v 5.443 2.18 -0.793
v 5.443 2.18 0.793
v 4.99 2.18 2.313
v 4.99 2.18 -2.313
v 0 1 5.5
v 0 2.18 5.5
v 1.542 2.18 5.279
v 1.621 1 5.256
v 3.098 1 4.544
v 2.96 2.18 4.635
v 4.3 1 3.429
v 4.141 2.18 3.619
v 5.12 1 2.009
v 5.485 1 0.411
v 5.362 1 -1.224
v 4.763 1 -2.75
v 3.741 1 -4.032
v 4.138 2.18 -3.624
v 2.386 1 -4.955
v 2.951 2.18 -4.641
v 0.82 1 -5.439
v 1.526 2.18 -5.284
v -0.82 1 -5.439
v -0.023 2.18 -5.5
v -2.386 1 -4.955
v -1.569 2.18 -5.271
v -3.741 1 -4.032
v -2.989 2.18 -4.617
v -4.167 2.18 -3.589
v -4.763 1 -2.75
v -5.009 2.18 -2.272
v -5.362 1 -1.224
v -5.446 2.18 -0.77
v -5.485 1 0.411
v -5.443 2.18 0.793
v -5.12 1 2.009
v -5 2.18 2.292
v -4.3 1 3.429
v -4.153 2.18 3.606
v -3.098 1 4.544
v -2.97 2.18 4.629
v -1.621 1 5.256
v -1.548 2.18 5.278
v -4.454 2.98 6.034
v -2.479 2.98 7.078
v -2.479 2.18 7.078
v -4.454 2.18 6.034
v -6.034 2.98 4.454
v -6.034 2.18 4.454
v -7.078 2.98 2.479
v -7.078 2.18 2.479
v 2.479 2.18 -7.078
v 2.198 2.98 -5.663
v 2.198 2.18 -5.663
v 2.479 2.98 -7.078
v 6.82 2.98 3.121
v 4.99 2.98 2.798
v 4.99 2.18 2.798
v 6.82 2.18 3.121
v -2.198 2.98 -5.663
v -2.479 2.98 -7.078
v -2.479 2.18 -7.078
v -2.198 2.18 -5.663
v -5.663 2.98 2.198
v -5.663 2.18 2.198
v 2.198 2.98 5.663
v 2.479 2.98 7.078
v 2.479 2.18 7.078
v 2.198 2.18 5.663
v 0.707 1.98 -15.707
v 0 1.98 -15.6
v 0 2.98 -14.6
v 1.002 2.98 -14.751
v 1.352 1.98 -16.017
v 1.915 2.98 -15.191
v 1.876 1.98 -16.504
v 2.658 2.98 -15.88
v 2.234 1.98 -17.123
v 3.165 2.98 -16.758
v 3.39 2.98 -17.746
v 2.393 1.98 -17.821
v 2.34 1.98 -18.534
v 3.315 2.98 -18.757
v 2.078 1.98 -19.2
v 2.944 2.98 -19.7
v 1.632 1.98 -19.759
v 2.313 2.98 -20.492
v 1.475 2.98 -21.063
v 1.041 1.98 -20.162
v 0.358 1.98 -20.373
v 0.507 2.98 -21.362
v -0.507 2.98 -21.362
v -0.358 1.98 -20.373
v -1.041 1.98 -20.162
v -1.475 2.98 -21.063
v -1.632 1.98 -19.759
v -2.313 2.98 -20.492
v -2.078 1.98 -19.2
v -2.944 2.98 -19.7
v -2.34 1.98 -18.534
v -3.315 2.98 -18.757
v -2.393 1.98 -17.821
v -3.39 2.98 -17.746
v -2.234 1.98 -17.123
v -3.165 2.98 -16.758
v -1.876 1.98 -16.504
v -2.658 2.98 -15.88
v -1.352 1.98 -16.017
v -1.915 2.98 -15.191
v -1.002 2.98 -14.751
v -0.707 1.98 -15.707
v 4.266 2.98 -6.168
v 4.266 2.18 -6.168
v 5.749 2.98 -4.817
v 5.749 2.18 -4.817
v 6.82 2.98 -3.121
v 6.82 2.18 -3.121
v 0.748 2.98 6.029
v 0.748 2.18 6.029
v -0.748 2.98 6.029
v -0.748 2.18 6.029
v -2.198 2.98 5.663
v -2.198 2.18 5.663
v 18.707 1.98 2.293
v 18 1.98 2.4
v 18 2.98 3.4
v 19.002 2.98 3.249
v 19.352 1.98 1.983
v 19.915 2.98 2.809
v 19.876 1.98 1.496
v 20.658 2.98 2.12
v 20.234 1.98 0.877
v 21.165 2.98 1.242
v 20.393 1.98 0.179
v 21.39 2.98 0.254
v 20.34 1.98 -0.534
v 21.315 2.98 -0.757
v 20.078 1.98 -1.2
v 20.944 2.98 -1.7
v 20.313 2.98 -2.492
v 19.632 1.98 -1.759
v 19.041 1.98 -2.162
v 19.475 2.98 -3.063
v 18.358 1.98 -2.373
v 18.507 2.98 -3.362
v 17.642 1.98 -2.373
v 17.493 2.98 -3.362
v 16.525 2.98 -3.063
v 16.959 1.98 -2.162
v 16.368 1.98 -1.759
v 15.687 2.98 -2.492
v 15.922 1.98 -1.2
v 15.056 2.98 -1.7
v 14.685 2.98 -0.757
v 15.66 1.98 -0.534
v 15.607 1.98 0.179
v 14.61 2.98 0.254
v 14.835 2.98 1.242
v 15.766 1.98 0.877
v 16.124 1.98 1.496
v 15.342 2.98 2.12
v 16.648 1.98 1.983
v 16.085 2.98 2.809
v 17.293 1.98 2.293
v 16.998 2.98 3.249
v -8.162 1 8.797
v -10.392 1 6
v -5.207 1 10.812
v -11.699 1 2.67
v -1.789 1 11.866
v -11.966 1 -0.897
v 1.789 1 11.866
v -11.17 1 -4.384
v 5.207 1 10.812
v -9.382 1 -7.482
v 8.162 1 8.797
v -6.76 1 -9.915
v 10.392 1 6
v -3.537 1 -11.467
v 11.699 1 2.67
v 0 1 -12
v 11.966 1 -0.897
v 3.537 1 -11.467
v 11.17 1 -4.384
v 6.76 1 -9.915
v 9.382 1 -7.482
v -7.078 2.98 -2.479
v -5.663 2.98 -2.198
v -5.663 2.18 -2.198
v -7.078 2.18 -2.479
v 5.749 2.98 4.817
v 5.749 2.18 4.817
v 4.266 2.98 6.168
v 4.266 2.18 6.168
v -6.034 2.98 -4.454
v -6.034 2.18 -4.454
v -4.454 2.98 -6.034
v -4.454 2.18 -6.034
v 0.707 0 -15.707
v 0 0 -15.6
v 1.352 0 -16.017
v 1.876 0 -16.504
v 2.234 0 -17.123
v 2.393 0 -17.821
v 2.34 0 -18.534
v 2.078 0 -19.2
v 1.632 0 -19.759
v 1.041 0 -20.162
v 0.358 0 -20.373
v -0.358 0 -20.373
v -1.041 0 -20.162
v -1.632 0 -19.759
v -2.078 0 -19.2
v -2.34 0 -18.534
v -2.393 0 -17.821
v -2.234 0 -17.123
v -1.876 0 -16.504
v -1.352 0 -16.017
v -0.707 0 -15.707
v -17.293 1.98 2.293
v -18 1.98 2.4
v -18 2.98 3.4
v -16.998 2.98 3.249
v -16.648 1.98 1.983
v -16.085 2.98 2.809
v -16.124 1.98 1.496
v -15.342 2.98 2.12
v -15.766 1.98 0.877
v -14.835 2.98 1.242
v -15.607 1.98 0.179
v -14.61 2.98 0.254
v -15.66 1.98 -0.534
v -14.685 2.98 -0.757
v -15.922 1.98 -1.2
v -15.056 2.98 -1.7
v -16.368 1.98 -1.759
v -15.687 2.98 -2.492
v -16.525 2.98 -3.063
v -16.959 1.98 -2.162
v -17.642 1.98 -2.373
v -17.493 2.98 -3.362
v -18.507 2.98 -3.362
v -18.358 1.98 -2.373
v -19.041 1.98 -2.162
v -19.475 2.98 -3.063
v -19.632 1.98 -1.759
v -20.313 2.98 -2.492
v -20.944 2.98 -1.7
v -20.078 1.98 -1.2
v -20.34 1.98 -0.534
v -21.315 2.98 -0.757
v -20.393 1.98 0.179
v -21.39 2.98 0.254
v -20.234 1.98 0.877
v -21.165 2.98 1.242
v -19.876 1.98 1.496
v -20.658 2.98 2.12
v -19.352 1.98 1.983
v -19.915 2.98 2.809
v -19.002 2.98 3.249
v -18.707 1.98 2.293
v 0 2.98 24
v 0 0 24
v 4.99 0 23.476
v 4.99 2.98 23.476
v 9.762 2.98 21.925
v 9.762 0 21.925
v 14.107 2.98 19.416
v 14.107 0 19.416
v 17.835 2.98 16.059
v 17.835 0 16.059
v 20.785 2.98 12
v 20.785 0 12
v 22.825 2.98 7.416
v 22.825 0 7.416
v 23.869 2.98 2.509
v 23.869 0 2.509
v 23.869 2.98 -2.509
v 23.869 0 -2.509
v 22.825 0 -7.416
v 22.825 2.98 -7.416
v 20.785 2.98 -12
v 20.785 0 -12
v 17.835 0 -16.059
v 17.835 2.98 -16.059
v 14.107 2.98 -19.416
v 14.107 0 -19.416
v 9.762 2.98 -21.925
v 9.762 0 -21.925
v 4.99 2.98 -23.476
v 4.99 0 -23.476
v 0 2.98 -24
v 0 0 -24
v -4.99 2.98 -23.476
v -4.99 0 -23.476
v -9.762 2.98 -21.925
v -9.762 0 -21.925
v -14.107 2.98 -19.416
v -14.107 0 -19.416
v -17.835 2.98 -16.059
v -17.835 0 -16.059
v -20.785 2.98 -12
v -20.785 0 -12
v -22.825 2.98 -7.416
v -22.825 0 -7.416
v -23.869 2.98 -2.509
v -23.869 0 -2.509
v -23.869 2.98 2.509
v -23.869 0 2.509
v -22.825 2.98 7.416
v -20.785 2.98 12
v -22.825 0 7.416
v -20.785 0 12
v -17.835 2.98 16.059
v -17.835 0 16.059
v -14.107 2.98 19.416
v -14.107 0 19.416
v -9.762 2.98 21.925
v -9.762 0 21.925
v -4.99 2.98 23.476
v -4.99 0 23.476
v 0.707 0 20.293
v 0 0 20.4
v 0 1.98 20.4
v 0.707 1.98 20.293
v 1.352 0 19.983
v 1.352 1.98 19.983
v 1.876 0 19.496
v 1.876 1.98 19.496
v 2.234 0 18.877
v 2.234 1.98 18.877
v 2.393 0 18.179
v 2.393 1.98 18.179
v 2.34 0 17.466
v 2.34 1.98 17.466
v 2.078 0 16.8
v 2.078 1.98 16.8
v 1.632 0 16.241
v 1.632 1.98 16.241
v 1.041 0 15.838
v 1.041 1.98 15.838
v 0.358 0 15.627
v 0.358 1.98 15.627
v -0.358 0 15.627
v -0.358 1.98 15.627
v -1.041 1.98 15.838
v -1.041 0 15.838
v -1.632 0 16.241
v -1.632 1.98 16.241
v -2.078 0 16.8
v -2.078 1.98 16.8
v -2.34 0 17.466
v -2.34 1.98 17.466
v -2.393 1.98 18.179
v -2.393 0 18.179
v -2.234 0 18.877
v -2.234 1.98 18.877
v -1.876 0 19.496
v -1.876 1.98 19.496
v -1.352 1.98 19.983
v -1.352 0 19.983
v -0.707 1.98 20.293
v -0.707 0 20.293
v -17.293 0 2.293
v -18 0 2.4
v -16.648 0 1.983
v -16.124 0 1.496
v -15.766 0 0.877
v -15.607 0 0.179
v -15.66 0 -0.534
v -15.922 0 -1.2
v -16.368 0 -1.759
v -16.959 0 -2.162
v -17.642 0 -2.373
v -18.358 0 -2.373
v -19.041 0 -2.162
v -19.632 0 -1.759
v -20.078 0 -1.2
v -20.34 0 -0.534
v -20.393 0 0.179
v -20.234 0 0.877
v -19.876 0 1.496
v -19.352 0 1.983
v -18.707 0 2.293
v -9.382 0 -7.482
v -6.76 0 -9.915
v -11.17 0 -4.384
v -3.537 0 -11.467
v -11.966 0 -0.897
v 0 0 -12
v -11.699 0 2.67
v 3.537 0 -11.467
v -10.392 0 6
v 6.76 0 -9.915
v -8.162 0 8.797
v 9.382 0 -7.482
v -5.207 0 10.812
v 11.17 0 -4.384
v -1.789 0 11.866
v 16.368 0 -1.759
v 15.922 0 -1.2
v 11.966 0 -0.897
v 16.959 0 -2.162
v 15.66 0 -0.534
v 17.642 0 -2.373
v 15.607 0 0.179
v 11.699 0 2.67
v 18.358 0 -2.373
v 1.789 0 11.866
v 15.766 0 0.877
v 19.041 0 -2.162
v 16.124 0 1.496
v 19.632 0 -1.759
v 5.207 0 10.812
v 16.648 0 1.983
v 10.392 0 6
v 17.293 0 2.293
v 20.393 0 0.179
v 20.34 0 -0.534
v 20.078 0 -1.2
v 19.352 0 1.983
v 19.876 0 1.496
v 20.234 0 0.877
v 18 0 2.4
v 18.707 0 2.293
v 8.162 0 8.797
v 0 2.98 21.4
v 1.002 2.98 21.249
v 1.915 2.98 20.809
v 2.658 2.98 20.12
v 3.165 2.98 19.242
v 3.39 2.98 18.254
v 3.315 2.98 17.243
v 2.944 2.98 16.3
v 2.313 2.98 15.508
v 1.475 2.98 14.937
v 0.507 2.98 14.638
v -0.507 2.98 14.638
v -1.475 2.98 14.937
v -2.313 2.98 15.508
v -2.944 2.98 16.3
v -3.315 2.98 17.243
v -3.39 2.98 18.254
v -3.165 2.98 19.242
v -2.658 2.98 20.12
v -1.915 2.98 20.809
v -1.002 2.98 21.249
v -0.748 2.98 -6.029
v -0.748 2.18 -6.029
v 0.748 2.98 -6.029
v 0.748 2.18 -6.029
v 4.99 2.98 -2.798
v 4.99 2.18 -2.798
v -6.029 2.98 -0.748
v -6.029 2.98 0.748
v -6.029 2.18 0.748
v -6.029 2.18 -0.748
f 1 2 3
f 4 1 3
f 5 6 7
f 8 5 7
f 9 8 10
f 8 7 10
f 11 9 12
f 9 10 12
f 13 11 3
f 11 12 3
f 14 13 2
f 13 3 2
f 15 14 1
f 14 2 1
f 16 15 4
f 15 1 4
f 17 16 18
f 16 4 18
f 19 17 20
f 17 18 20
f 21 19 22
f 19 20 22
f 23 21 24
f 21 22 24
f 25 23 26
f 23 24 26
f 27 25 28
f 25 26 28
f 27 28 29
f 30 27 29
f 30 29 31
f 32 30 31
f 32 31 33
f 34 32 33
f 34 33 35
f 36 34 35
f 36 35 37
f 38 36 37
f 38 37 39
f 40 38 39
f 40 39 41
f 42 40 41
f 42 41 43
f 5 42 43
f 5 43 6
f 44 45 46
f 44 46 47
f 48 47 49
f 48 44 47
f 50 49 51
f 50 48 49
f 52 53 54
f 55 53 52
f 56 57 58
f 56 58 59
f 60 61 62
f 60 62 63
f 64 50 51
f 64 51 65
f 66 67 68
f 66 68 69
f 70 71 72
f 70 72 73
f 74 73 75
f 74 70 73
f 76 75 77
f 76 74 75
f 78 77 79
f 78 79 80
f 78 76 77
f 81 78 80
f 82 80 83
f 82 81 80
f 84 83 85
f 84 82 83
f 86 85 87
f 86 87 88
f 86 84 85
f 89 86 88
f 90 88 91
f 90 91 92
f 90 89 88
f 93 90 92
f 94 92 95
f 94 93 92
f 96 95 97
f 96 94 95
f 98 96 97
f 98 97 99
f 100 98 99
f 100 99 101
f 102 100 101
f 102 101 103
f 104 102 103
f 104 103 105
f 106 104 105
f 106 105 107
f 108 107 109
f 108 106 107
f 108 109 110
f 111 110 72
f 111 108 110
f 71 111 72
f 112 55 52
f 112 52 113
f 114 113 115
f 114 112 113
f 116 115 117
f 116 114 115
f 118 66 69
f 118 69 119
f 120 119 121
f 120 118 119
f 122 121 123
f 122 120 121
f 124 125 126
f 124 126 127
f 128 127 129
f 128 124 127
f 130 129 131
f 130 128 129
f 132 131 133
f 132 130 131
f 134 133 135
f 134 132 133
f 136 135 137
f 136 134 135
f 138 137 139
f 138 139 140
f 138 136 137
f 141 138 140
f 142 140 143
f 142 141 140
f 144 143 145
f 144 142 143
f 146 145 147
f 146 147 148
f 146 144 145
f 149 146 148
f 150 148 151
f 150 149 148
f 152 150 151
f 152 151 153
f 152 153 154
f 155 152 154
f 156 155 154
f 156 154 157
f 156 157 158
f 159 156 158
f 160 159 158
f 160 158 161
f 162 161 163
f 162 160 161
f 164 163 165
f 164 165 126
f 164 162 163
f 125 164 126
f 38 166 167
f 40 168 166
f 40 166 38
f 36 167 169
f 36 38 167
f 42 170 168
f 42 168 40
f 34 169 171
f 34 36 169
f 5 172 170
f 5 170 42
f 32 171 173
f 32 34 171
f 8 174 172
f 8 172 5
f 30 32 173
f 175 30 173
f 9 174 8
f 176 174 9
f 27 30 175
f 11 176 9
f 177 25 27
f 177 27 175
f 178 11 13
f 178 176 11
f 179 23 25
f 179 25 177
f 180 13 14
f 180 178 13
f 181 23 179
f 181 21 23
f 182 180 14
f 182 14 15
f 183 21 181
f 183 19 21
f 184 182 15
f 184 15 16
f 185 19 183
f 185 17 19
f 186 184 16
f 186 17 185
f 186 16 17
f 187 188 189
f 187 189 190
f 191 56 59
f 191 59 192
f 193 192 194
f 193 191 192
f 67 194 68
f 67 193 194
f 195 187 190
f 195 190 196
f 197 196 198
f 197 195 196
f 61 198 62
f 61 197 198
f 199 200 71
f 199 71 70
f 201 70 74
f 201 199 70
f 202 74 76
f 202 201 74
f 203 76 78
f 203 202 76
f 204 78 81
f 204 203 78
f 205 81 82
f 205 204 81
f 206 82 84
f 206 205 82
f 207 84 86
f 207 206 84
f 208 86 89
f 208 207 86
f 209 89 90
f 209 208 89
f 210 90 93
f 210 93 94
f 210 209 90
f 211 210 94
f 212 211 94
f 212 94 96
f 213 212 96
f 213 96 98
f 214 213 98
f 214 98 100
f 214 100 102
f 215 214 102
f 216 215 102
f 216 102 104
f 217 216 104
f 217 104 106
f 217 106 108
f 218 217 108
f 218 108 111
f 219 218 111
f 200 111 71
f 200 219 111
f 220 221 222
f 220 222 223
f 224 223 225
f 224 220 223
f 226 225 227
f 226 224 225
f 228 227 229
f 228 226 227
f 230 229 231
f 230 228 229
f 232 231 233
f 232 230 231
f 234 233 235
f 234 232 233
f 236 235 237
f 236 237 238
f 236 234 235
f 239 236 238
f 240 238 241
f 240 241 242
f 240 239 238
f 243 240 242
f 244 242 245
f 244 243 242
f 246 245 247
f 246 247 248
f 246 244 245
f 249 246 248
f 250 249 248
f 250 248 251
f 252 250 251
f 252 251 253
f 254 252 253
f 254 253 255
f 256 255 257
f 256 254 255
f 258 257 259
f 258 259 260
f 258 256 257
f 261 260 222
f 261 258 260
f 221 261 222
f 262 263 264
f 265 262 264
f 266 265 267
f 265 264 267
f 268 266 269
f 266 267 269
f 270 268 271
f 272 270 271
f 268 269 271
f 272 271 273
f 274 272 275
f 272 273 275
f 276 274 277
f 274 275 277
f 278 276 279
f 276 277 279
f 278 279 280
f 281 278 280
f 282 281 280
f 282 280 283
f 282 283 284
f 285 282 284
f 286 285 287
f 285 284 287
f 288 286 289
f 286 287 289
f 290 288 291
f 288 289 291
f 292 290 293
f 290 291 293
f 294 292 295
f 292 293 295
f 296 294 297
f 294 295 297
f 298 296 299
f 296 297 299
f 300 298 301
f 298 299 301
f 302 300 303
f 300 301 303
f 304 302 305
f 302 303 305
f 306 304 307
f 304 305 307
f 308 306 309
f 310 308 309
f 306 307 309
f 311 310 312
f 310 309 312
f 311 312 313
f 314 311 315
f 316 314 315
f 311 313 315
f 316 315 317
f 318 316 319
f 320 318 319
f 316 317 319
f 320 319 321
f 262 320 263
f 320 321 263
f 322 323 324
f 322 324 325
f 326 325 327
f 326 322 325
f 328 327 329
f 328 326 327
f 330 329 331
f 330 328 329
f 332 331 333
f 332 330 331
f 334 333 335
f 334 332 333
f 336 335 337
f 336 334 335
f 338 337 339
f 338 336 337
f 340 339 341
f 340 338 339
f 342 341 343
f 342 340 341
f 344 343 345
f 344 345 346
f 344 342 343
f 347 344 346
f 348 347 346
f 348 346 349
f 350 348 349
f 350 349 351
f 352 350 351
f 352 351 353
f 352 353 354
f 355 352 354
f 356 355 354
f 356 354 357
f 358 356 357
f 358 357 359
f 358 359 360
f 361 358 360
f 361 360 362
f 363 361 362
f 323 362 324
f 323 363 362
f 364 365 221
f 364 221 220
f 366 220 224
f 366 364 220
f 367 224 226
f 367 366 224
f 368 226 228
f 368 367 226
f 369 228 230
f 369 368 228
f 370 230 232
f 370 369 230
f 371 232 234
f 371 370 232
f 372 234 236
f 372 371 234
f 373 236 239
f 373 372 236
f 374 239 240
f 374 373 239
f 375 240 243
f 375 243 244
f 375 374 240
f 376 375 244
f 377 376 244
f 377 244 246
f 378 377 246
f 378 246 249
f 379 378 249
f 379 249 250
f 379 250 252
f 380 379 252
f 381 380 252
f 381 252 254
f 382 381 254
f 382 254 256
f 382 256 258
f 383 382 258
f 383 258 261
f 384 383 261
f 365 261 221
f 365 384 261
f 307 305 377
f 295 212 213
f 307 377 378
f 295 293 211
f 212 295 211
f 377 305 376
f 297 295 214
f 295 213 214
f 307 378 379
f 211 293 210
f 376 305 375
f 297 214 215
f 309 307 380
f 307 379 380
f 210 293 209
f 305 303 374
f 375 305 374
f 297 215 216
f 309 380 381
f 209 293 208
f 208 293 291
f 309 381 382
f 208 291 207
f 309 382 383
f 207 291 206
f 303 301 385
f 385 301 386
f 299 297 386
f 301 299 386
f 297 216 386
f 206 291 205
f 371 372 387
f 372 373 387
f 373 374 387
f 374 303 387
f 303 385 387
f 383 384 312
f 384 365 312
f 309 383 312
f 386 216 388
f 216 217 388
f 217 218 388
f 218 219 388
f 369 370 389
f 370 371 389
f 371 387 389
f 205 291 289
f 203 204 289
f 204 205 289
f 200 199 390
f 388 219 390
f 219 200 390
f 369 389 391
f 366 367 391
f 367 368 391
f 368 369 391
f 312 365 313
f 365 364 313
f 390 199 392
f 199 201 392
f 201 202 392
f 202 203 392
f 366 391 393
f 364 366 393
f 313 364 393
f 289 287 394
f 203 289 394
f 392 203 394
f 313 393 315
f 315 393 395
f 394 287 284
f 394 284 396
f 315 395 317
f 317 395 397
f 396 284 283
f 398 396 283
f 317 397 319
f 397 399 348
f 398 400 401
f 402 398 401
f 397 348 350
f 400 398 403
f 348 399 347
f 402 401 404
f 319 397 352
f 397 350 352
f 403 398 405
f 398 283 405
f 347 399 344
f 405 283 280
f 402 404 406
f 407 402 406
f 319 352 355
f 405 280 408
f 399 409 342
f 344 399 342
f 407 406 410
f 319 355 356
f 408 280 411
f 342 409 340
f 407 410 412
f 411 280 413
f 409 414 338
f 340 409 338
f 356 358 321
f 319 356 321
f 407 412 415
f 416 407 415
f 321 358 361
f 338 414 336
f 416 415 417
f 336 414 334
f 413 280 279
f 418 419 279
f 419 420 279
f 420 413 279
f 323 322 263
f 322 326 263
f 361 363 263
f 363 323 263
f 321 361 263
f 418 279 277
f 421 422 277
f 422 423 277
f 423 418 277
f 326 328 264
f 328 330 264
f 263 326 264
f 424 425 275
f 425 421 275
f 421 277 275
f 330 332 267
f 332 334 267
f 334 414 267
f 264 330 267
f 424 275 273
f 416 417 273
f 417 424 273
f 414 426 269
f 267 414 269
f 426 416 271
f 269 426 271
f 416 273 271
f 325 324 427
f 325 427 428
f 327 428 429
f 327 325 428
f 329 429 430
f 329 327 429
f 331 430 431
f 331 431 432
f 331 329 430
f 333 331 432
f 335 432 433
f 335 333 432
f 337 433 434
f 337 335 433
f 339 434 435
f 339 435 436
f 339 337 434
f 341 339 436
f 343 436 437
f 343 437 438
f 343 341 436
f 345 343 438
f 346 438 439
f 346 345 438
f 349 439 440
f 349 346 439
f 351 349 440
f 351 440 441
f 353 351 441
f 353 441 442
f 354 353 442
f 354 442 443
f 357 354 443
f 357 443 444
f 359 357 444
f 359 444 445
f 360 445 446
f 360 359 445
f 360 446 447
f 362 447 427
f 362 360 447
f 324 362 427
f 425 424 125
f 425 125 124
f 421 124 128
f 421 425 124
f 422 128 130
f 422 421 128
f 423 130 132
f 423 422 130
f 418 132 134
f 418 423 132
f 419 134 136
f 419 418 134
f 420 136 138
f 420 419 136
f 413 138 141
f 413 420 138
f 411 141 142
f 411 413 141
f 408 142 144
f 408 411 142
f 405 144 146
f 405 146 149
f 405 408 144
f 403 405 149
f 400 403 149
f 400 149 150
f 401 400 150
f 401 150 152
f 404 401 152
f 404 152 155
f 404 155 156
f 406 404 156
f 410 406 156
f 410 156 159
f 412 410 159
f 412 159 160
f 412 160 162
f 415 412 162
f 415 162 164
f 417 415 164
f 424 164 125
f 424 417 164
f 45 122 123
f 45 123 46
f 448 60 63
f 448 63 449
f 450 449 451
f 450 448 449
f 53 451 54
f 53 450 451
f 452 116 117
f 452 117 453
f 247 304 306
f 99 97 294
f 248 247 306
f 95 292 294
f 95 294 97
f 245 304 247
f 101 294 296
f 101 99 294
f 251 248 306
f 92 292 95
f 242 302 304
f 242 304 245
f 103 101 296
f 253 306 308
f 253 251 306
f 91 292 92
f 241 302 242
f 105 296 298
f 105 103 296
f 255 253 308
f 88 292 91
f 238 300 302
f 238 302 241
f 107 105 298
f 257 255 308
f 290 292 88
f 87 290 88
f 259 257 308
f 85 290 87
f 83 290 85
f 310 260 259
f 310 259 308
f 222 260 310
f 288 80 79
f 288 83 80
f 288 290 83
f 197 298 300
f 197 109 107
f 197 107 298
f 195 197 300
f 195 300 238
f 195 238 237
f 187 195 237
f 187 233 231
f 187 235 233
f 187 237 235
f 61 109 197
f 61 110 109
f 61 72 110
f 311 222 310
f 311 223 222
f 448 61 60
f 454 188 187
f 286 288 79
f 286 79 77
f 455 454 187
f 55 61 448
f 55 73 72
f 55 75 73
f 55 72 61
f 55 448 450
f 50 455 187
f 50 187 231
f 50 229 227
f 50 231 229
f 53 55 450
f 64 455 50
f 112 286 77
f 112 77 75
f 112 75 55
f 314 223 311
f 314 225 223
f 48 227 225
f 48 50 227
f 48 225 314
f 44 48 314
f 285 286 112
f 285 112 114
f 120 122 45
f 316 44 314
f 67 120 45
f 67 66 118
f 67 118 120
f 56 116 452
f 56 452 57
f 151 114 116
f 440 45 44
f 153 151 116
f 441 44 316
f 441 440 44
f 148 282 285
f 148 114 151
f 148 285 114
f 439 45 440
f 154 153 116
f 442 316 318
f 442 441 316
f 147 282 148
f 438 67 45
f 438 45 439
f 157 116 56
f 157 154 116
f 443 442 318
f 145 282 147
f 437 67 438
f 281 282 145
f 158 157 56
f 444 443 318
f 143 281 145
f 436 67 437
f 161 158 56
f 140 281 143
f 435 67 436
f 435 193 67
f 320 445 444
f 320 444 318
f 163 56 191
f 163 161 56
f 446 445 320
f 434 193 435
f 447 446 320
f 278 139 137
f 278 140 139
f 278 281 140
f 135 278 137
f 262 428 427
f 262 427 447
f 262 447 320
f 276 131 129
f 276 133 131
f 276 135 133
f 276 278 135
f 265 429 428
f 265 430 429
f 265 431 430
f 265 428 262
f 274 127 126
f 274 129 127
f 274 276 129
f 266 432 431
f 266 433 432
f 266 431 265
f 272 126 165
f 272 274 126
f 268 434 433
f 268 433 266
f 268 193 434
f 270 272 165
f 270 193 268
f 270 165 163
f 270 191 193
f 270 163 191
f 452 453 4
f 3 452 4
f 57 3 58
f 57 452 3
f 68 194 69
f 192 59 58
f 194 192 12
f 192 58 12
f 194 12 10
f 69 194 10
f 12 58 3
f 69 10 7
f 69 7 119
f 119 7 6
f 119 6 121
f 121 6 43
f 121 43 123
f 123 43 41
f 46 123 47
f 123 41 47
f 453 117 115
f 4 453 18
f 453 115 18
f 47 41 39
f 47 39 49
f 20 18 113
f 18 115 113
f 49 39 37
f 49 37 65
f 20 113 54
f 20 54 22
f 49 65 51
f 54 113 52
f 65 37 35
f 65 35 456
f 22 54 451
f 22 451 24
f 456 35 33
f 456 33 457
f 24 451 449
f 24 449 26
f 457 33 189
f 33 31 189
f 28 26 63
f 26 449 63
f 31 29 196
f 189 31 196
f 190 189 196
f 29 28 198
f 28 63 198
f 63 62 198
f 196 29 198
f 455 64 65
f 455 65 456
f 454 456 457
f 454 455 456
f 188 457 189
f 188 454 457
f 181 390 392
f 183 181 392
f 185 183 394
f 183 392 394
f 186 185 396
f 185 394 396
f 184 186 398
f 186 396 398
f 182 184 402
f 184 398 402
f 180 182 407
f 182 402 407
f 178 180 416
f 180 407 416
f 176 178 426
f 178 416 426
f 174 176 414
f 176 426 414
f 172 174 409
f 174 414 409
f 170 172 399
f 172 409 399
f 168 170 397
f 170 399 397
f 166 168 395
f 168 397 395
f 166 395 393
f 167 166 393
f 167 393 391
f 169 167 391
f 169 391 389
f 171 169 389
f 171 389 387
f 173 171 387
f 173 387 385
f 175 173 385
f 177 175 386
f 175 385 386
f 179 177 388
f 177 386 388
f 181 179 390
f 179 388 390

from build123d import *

# Parameters (mm, degrees)
SKETCH1_R           = 24
SKETCH1_R_2         = 2.4
BOSS_EXTRUDE1_DEPTH = 2.98
CUT_EXTRUDE1_DEPTH  = 0.8
SKETCH3_R           = 5.5
CUT_EXTRUDE2_DEPTH  = 35.011062906
CHAMFER1_SIZE       = 1
SKETCH4_R           = 12
CUT_EXTRUDE3_DEPTH  = 1


with BuildPart() as part:
    # Sketch1 → Boss-Extrude1 (new body)
    with BuildSketch(Plane(origin=(0, 0, 0), x_dir=(1, 0, 0), z_dir=(0, 1, 0))):
        with Locations(Location((0, 0, 0), (0, 0, 270))):
            Circle(SKETCH1_R)
        with Locations(Location((0, 18, 0), (0, 0, 270))):
            Circle(SKETCH1_R_2, mode=Mode.SUBTRACT)
        with Locations(Location((-18, 0, 0), (0, 0, 270))):
            Circle(SKETCH1_R_2, mode=Mode.SUBTRACT)
        with Locations(Location((0, -18, 0), (0, 0, 270))):
            Circle(SKETCH1_R_2, mode=Mode.SUBTRACT)
        with Locations(Location((18, 0, 0), (0, 0, 270))):
            Circle(SKETCH1_R_2, mode=Mode.SUBTRACT)
    extrude(amount=BOSS_EXTRUDE1_DEPTH)

    # Sketch2 → Cut-Extrude1 (cut)
    with BuildSketch(Plane(origin=(0, 2.98, 0), x_dir=(1, 0, 0), z_dir=(0, 1, 0))):
        with BuildLine():
            Line((4.989999, 2.798442301), (4.989999, -2.798442301))
            Line((4.989999, -2.798442301), (6.819742519, -3.121075451))
            ThreePointArc((6.819742519, -3.121075451), (5.052929001, -5.542373906), (2.479055714, -7.078437876))
            Line((2.479055714, -7.078437876), (2.198435941, -5.663259169))
            ThreePointArc((2.198435941, -5.663259169), (0, -6.075), (-2.198435941, -5.663259169))
            Line((-2.198435941, -5.663259169), (-2.479055714, -7.078437876))
            ThreePointArc((-2.479055714, -7.078437876), (-5.303300859, -5.303300859), (-7.078437876, -2.479055714))
            Line((-7.078437876, -2.479055714), (-5.663259169, -2.198435941))
            ThreePointArc((-5.663259169, -2.198435941), (-6.075, 0), (-5.663259169, 2.198435941))
            Line((-5.663259169, 2.198435941), (-7.078437876, 2.479055714))
            ThreePointArc((-7.078437876, 2.479055714), (-5.303300859, 5.303300859), (-2.479055714, 7.078437876))
            Line((-2.479055714, 7.078437876), (-2.198435941, 5.663259169))
            ThreePointArc((-2.198435941, 5.663259169), (0, 6.075), (2.198435941, 5.663259169))
            Line((2.198435941, 5.663259169), (2.479055714, 7.078437876))
            ThreePointArc((2.479055714, 7.078437876), (5.052929001, 5.542373906), (6.819742519, 3.121075451))
            Line((6.819742519, 3.121075451), (4.989999, 2.798442301))
        make_face()
    extrude(amount=-CUT_EXTRUDE1_DEPTH, mode=Mode.SUBTRACT)

    # Sketch3 → Cut-Extrude2 (cut, through all)
    with BuildSketch(Plane(origin=(0, 2.18, 0), x_dir=(1, 0, 0), z_dir=(0, 1, 0))):
        with Locations(Location((0, 0, 0), (0, 0, 270))):
            Circle(SKETCH3_R)
    extrude(amount=-CUT_EXTRUDE2_DEPTH, mode=Mode.SUBTRACT)

    # Chamfer1
    chamfer1_edges = [part.edges().sort_by_distance(p)[0] for p in [
        (0, 2.98, -20.4),
        (-18, 2.98, -2.4),
        (0, 2.98, 15.6),
        (18, 2.98, -2.4),
    ]]
    chamfer(chamfer1_edges, length=CHAMFER1_SIZE)

    # Sketch4 → Cut-Extrude3 (cut)
    with BuildSketch(Plane.XZ):
        with Locations(Location((0, 0, 0), (0, 0, 270))):
            Circle(SKETCH4_R)
    extrude(amount=-CUT_EXTRUDE3_DEPTH, mode=Mode.SUBTRACT)


solid = part.part
